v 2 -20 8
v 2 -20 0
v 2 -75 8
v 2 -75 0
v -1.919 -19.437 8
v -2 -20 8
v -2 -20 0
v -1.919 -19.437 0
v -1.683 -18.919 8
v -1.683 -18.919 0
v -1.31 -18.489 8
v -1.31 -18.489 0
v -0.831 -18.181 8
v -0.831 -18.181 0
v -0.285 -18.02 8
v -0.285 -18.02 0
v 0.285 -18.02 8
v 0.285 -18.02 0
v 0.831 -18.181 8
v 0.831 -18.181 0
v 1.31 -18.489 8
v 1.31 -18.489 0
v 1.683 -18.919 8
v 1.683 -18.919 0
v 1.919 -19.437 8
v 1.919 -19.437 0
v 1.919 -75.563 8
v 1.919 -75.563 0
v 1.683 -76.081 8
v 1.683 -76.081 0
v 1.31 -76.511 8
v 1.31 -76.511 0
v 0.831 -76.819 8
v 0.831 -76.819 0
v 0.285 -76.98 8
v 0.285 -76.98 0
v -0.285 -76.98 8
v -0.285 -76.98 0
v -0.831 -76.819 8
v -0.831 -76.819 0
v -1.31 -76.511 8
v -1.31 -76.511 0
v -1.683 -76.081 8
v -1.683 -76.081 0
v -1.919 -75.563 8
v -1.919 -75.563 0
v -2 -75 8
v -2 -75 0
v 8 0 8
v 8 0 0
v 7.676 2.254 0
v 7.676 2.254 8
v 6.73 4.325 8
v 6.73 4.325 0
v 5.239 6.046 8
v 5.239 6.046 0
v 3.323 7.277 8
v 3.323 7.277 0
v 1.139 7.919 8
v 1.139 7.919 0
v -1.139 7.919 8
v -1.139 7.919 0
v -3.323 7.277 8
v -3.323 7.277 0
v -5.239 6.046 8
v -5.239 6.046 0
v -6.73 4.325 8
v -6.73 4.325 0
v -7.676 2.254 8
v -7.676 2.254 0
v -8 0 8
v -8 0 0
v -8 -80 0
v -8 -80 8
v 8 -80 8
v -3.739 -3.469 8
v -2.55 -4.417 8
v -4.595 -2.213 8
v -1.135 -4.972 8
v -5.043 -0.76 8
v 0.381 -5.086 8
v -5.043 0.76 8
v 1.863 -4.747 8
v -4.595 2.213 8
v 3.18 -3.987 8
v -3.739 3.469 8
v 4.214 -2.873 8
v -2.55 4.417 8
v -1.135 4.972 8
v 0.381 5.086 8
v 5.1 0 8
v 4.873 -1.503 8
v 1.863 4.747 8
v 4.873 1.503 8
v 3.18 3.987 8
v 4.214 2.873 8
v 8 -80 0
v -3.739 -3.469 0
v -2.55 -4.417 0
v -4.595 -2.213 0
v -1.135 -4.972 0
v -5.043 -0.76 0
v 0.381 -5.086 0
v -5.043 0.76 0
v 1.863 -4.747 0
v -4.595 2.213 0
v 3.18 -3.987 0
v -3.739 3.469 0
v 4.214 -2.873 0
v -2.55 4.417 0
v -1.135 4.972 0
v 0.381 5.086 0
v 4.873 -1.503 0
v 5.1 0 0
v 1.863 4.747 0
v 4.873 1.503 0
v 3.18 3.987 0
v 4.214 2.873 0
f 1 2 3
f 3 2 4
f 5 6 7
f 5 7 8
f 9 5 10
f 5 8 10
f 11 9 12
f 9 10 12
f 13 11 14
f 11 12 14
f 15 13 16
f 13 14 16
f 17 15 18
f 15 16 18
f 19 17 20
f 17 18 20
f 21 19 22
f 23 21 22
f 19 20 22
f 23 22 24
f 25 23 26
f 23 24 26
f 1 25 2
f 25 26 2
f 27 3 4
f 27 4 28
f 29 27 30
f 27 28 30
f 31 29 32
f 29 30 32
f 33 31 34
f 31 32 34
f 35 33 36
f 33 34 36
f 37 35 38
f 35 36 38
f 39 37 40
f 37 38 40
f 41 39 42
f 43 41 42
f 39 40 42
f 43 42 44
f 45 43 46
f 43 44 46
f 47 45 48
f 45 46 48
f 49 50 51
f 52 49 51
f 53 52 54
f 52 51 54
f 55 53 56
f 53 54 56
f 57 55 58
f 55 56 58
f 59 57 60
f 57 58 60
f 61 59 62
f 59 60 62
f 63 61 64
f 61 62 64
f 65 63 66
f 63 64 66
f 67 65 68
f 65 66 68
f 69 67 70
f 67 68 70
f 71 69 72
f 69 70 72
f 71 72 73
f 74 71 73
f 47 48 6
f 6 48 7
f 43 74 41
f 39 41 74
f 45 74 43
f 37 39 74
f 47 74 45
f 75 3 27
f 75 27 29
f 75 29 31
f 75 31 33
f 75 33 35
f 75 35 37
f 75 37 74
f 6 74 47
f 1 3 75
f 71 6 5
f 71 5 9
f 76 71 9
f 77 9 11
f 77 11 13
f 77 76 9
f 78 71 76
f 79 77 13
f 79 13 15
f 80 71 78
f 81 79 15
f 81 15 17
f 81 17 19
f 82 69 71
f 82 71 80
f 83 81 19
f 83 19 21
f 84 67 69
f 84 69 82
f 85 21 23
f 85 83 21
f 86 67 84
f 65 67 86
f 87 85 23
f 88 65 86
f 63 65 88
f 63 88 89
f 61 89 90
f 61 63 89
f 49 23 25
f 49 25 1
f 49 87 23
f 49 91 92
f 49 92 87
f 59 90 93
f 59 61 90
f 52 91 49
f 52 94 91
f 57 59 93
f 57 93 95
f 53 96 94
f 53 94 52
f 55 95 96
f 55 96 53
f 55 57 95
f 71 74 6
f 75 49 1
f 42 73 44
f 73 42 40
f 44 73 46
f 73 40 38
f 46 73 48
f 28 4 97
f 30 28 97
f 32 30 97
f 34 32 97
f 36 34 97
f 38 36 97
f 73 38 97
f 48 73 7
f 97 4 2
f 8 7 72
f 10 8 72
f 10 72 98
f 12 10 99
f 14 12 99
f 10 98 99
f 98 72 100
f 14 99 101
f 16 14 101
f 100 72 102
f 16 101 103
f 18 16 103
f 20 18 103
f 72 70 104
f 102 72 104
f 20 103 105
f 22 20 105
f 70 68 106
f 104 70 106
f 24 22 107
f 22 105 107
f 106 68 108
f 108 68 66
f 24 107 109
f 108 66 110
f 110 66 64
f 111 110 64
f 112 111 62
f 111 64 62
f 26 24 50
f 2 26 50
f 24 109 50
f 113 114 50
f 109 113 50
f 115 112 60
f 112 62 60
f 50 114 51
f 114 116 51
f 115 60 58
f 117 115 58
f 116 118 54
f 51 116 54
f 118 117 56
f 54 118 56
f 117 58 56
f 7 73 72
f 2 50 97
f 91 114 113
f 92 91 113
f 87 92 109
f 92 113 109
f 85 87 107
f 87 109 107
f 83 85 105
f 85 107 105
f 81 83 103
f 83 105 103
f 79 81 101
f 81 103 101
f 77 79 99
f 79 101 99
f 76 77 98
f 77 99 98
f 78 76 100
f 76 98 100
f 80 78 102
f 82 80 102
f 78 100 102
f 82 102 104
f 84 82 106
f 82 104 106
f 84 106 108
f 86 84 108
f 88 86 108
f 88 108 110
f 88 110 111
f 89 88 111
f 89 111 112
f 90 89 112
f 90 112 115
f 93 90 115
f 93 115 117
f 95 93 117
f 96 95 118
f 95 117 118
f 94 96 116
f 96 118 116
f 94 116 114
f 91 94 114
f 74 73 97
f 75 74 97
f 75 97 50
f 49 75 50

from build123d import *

# Parameters (mm, degrees)
F1_DEPTH = 8


with BuildPart() as f1:
    # F0 (on Top) → F1 (new body)
    with BuildSketch(Plane.XY):
        with BuildLine():
            ThreePointArc((-5.1, 0), (0, 5.1), (5.1, 0))
            Line((5.1, 0), (8, 0))
            ThreePointArc((8, 0), (0, 8), (-8, 0))
            Line((-8, 0), (-5.1, 0))
        make_face()
        with BuildLine():
            Line((8, 0), (5.1, 0))
            ThreePointArc((5.1, 0), (0, -5.1), (-5.1, 0))
            Line((-5.1, 0), (-8, 0))
            ThreePointArc((-8, 0), (0, -8), (8, 0))
        make_face()
        with BuildLine():
            Line((8, -80), (8, 0))
            ThreePointArc((8, 0), (0, -8), (-8, 0))
            Line((-8, 0), (-8, -80))
            Line((-8, -80), (8, -80))
        make_face()
        with BuildLine():
            ThreePointArc((-2, -20), (0, -18), (2, -20))
            Line((2, -20), (2, -75))
            ThreePointArc((2, -75), (0, -77), (-2, -75))
            Line((-2, -75), (-2, -20))
        make_face(mode=Mode.SUBTRACT)
    extrude(amount=F1_DEPTH)


solid = f1.part
